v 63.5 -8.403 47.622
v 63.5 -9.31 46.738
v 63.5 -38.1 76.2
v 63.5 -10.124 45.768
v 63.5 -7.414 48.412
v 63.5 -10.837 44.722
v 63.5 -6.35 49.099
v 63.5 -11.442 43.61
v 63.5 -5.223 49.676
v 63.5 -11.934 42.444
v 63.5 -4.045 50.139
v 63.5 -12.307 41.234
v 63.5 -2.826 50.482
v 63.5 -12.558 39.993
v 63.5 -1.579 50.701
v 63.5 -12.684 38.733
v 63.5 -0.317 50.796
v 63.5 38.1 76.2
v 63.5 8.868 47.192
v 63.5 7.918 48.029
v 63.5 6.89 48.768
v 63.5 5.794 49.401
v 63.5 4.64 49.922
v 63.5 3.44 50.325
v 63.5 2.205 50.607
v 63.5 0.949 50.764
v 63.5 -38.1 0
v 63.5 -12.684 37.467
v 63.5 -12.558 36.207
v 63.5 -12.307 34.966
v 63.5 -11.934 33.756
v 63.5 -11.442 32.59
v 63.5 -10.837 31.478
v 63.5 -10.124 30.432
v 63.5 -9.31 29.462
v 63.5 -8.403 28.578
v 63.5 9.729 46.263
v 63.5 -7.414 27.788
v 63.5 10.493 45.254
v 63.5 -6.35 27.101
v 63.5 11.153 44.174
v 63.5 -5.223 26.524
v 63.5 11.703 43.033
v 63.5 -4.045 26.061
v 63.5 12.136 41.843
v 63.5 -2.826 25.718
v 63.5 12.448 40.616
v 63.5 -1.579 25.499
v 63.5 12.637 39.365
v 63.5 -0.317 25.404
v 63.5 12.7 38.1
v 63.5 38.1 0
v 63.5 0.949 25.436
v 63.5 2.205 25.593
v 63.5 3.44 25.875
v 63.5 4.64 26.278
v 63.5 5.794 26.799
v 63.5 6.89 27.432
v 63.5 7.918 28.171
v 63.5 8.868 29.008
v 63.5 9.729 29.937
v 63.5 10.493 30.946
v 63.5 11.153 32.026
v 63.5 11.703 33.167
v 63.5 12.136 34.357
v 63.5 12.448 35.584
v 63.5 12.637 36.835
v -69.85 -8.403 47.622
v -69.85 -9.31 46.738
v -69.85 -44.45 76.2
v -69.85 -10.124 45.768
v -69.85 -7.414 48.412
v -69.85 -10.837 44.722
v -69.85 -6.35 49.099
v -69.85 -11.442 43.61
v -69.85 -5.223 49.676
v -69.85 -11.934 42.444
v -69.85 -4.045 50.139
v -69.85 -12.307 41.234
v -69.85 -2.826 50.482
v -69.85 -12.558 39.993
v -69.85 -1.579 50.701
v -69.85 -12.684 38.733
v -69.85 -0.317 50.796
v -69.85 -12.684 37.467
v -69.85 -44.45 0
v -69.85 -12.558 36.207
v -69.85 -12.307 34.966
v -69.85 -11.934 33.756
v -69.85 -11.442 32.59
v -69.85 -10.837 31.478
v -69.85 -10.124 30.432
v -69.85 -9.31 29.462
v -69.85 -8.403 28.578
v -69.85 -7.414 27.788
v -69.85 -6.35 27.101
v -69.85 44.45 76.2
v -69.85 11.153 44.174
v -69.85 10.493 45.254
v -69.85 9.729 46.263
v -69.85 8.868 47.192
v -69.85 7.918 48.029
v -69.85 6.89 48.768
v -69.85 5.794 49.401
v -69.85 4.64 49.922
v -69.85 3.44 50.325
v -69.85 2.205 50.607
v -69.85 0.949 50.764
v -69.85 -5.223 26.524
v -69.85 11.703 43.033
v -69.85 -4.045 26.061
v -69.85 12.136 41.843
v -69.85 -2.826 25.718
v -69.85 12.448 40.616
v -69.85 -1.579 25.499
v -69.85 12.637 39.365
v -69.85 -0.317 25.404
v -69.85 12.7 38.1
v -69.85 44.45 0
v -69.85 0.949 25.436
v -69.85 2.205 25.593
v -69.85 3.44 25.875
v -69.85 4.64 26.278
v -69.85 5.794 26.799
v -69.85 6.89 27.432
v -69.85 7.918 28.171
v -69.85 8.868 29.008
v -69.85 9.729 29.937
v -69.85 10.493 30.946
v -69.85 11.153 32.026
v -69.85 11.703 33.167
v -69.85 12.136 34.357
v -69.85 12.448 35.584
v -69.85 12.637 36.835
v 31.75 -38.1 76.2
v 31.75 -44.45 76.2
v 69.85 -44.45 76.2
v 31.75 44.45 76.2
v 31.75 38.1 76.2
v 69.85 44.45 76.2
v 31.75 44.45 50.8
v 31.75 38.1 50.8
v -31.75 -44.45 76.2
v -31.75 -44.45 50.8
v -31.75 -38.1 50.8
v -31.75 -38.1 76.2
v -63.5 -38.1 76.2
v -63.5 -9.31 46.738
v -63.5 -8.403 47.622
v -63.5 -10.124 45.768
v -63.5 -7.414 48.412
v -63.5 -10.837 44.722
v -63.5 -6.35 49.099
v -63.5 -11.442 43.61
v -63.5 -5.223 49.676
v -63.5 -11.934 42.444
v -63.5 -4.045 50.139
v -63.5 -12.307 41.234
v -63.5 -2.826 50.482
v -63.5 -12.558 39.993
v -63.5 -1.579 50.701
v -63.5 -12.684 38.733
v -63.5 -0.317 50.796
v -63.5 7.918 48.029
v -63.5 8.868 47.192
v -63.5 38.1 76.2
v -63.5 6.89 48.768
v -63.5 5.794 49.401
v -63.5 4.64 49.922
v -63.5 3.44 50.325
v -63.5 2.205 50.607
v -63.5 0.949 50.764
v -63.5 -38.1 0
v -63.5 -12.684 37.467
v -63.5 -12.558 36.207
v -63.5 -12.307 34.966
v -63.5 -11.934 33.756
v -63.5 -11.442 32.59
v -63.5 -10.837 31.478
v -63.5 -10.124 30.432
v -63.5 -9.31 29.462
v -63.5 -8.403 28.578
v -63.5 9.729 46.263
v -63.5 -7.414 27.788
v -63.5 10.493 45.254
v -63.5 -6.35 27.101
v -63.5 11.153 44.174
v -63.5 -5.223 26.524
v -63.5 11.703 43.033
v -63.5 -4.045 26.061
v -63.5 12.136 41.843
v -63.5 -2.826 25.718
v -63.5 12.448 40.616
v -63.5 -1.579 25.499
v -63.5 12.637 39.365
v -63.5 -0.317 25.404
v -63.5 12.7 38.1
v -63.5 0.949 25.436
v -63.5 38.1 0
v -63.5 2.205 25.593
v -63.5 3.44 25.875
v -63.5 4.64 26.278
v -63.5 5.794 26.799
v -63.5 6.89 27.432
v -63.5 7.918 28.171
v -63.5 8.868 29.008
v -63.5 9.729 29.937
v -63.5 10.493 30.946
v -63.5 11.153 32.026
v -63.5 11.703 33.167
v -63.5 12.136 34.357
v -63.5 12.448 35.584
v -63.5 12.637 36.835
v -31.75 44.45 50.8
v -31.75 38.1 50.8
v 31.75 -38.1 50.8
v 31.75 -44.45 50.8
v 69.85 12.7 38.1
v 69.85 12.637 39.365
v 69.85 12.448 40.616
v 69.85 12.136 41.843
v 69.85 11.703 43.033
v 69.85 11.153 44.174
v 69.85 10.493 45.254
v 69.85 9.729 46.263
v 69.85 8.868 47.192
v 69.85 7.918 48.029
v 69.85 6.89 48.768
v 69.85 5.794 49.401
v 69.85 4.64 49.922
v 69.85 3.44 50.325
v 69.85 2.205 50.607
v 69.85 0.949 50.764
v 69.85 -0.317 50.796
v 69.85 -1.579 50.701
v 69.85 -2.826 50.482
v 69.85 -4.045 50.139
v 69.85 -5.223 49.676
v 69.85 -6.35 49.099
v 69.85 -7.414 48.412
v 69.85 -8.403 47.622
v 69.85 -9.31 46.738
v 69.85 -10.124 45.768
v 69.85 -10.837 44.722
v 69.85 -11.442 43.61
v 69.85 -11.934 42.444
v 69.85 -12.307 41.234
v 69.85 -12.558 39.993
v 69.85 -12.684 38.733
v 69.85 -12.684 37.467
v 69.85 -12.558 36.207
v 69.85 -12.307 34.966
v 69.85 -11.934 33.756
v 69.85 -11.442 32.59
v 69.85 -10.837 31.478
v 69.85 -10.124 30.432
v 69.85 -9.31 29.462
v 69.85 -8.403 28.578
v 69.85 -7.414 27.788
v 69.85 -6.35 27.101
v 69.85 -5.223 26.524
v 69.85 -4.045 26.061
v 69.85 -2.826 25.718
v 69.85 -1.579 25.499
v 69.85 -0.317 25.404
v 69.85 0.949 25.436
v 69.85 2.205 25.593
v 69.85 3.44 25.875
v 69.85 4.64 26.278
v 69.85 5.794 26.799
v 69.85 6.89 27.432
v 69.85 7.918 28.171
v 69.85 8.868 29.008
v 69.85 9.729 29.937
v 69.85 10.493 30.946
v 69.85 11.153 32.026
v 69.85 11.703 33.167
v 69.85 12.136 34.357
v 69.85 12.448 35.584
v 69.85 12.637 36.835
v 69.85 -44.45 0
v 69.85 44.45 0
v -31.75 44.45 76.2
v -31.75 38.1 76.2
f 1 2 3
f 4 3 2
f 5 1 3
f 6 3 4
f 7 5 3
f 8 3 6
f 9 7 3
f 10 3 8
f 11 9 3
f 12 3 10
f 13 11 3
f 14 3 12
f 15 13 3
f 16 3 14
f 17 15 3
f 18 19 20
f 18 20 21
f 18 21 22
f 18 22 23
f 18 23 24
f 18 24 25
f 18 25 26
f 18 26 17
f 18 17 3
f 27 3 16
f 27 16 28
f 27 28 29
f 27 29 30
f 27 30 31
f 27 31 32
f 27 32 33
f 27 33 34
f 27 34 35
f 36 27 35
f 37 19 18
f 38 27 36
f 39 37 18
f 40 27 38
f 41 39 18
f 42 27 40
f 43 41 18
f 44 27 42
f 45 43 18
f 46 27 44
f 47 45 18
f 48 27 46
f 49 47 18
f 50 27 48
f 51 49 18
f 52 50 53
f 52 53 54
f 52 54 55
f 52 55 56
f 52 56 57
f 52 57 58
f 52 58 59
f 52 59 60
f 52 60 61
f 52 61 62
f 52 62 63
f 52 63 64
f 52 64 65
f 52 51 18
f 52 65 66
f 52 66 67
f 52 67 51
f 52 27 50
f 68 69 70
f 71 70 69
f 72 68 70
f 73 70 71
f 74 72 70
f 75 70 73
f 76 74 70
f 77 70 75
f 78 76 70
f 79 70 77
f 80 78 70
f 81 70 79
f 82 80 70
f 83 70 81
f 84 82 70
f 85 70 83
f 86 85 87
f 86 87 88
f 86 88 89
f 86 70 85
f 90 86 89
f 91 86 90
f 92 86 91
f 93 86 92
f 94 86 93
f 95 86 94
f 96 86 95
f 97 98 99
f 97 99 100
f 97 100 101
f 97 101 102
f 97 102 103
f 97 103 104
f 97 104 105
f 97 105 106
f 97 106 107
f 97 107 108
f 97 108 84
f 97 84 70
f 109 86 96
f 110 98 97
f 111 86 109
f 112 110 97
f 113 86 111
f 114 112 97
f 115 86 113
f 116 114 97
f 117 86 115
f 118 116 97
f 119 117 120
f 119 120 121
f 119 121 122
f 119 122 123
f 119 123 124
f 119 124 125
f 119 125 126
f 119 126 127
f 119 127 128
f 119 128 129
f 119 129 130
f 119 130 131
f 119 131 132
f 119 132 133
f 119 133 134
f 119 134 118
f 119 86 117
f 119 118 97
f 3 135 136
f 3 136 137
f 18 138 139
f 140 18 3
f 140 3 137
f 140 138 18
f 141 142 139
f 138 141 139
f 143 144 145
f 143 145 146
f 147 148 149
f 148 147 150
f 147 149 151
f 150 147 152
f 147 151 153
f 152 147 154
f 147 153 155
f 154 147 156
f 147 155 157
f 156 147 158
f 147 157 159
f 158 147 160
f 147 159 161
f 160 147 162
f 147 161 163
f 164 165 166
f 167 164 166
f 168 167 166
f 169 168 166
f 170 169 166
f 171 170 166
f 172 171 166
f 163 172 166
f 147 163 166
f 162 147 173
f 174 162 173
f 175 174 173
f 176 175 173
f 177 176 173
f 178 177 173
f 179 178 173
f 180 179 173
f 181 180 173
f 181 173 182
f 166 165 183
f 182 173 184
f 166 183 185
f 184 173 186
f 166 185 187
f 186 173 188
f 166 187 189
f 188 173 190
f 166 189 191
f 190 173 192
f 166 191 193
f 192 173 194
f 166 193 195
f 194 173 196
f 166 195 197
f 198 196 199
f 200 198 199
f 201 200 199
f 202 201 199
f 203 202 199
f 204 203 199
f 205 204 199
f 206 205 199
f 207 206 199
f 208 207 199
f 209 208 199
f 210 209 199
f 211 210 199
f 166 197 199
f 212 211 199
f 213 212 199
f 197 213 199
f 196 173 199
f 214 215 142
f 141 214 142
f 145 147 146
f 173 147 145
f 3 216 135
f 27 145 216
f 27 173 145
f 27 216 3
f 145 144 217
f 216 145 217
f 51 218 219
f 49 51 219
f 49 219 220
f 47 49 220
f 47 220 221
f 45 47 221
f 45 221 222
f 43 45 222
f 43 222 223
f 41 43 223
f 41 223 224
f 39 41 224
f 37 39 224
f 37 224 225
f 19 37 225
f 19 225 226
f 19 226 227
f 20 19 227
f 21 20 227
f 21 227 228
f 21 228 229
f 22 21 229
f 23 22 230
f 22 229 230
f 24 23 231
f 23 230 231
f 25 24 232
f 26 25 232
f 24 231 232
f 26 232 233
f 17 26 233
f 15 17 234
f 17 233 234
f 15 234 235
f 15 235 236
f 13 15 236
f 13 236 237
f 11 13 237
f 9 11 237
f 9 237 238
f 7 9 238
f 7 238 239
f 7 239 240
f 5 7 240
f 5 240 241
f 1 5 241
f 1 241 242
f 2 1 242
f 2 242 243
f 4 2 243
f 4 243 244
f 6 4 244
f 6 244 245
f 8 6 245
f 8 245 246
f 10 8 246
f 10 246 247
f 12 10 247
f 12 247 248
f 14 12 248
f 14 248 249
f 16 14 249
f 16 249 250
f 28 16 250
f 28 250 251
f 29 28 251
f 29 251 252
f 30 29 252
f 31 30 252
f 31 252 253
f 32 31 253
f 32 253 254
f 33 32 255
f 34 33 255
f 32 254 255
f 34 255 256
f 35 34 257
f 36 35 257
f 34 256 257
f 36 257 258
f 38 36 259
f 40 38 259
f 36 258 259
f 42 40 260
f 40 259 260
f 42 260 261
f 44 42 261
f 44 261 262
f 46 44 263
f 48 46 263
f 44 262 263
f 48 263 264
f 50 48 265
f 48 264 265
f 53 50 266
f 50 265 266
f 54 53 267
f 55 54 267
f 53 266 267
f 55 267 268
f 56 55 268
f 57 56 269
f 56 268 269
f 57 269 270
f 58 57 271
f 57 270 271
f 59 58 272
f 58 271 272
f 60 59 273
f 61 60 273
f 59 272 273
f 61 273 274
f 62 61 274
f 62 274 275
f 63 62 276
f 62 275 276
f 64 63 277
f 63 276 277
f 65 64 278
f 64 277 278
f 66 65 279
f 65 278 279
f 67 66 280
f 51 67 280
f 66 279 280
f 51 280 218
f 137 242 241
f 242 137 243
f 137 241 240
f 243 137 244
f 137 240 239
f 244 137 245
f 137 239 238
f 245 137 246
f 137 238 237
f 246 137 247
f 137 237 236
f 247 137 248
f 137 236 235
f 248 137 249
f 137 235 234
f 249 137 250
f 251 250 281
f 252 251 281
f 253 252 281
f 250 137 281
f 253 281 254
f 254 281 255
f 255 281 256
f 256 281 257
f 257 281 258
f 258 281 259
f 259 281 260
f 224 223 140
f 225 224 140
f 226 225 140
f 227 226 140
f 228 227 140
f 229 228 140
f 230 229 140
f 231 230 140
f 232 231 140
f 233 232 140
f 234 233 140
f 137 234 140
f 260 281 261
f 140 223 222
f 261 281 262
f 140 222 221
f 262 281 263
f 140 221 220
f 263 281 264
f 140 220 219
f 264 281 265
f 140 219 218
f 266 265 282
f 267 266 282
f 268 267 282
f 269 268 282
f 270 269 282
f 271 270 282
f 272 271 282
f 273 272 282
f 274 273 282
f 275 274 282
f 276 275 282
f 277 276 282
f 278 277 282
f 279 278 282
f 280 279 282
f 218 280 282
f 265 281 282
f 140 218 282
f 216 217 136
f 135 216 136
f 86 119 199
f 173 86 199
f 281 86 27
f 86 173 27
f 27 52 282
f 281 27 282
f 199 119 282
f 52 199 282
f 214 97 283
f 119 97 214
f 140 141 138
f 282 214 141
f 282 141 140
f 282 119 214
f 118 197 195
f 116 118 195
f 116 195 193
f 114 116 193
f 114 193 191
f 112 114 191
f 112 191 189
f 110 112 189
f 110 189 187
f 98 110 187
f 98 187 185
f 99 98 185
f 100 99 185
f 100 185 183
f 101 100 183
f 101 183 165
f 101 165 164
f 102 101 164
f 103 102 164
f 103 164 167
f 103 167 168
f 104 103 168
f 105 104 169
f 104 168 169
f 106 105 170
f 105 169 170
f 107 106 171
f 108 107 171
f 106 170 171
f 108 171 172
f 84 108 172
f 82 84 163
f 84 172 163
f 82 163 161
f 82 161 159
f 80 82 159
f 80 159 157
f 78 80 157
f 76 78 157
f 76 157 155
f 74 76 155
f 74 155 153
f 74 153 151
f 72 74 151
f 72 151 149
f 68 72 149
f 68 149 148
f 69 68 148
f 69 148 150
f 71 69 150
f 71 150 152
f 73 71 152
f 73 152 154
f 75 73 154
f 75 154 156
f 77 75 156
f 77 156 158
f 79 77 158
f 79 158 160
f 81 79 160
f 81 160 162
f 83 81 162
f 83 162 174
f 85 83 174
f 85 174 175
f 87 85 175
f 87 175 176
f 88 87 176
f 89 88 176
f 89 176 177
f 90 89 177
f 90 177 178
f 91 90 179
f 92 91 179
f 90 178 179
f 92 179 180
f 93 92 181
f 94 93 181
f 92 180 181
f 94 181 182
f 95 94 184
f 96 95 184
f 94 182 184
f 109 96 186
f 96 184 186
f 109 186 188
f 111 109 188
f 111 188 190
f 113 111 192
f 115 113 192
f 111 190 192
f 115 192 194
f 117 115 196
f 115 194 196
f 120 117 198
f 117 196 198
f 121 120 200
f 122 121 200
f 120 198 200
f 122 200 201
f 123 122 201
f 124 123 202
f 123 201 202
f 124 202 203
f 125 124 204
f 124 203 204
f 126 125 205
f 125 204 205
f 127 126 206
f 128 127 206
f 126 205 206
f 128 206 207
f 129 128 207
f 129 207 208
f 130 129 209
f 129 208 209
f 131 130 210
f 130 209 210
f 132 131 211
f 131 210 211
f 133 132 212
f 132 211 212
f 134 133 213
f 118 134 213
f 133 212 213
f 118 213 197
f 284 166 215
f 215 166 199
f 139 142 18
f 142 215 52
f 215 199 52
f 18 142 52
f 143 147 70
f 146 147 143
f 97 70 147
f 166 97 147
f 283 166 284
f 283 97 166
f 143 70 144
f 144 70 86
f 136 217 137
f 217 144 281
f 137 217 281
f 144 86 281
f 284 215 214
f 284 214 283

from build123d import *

# Parameters (mm, degrees)
F0_W     = 139.7
F0_H     = 88.9
F0_W_2   = 127
F0_H_2   = 76.2
F1_DEPTH = 76.2
F2_W     = 63.5
F2_H     = 25.4
F3_DEPTH = 166.37
F4_R     = 12.7
F5_DEPTH = 213.36


with BuildPart() as f1:
    # F0 (on Top) → F1 (new body)
    with BuildSketch(Plane.XY):
        Rectangle(F0_W, F0_H)
        Rectangle(F0_W_2, F0_H_2, mode=Mode.SUBTRACT)
    extrude(amount=F1_DEPTH)

    # F2 (on face) → F3 (cut)
    with BuildSketch(Plane.XZ.offset(44.45)):
        with Locations((0, 63.5)):
            Rectangle(F2_W, F2_H)
    extrude(amount=-F3_DEPTH, mode=Mode.SUBTRACT)

    # F4 (on face) → F5 (cut)
    with BuildSketch(Plane.YZ.offset(69.85)):
        with Locations((0, 38.1)):
            Circle(F4_R)
    extrude(amount=-F5_DEPTH, mode=Mode.SUBTRACT)


solid = f1.part
